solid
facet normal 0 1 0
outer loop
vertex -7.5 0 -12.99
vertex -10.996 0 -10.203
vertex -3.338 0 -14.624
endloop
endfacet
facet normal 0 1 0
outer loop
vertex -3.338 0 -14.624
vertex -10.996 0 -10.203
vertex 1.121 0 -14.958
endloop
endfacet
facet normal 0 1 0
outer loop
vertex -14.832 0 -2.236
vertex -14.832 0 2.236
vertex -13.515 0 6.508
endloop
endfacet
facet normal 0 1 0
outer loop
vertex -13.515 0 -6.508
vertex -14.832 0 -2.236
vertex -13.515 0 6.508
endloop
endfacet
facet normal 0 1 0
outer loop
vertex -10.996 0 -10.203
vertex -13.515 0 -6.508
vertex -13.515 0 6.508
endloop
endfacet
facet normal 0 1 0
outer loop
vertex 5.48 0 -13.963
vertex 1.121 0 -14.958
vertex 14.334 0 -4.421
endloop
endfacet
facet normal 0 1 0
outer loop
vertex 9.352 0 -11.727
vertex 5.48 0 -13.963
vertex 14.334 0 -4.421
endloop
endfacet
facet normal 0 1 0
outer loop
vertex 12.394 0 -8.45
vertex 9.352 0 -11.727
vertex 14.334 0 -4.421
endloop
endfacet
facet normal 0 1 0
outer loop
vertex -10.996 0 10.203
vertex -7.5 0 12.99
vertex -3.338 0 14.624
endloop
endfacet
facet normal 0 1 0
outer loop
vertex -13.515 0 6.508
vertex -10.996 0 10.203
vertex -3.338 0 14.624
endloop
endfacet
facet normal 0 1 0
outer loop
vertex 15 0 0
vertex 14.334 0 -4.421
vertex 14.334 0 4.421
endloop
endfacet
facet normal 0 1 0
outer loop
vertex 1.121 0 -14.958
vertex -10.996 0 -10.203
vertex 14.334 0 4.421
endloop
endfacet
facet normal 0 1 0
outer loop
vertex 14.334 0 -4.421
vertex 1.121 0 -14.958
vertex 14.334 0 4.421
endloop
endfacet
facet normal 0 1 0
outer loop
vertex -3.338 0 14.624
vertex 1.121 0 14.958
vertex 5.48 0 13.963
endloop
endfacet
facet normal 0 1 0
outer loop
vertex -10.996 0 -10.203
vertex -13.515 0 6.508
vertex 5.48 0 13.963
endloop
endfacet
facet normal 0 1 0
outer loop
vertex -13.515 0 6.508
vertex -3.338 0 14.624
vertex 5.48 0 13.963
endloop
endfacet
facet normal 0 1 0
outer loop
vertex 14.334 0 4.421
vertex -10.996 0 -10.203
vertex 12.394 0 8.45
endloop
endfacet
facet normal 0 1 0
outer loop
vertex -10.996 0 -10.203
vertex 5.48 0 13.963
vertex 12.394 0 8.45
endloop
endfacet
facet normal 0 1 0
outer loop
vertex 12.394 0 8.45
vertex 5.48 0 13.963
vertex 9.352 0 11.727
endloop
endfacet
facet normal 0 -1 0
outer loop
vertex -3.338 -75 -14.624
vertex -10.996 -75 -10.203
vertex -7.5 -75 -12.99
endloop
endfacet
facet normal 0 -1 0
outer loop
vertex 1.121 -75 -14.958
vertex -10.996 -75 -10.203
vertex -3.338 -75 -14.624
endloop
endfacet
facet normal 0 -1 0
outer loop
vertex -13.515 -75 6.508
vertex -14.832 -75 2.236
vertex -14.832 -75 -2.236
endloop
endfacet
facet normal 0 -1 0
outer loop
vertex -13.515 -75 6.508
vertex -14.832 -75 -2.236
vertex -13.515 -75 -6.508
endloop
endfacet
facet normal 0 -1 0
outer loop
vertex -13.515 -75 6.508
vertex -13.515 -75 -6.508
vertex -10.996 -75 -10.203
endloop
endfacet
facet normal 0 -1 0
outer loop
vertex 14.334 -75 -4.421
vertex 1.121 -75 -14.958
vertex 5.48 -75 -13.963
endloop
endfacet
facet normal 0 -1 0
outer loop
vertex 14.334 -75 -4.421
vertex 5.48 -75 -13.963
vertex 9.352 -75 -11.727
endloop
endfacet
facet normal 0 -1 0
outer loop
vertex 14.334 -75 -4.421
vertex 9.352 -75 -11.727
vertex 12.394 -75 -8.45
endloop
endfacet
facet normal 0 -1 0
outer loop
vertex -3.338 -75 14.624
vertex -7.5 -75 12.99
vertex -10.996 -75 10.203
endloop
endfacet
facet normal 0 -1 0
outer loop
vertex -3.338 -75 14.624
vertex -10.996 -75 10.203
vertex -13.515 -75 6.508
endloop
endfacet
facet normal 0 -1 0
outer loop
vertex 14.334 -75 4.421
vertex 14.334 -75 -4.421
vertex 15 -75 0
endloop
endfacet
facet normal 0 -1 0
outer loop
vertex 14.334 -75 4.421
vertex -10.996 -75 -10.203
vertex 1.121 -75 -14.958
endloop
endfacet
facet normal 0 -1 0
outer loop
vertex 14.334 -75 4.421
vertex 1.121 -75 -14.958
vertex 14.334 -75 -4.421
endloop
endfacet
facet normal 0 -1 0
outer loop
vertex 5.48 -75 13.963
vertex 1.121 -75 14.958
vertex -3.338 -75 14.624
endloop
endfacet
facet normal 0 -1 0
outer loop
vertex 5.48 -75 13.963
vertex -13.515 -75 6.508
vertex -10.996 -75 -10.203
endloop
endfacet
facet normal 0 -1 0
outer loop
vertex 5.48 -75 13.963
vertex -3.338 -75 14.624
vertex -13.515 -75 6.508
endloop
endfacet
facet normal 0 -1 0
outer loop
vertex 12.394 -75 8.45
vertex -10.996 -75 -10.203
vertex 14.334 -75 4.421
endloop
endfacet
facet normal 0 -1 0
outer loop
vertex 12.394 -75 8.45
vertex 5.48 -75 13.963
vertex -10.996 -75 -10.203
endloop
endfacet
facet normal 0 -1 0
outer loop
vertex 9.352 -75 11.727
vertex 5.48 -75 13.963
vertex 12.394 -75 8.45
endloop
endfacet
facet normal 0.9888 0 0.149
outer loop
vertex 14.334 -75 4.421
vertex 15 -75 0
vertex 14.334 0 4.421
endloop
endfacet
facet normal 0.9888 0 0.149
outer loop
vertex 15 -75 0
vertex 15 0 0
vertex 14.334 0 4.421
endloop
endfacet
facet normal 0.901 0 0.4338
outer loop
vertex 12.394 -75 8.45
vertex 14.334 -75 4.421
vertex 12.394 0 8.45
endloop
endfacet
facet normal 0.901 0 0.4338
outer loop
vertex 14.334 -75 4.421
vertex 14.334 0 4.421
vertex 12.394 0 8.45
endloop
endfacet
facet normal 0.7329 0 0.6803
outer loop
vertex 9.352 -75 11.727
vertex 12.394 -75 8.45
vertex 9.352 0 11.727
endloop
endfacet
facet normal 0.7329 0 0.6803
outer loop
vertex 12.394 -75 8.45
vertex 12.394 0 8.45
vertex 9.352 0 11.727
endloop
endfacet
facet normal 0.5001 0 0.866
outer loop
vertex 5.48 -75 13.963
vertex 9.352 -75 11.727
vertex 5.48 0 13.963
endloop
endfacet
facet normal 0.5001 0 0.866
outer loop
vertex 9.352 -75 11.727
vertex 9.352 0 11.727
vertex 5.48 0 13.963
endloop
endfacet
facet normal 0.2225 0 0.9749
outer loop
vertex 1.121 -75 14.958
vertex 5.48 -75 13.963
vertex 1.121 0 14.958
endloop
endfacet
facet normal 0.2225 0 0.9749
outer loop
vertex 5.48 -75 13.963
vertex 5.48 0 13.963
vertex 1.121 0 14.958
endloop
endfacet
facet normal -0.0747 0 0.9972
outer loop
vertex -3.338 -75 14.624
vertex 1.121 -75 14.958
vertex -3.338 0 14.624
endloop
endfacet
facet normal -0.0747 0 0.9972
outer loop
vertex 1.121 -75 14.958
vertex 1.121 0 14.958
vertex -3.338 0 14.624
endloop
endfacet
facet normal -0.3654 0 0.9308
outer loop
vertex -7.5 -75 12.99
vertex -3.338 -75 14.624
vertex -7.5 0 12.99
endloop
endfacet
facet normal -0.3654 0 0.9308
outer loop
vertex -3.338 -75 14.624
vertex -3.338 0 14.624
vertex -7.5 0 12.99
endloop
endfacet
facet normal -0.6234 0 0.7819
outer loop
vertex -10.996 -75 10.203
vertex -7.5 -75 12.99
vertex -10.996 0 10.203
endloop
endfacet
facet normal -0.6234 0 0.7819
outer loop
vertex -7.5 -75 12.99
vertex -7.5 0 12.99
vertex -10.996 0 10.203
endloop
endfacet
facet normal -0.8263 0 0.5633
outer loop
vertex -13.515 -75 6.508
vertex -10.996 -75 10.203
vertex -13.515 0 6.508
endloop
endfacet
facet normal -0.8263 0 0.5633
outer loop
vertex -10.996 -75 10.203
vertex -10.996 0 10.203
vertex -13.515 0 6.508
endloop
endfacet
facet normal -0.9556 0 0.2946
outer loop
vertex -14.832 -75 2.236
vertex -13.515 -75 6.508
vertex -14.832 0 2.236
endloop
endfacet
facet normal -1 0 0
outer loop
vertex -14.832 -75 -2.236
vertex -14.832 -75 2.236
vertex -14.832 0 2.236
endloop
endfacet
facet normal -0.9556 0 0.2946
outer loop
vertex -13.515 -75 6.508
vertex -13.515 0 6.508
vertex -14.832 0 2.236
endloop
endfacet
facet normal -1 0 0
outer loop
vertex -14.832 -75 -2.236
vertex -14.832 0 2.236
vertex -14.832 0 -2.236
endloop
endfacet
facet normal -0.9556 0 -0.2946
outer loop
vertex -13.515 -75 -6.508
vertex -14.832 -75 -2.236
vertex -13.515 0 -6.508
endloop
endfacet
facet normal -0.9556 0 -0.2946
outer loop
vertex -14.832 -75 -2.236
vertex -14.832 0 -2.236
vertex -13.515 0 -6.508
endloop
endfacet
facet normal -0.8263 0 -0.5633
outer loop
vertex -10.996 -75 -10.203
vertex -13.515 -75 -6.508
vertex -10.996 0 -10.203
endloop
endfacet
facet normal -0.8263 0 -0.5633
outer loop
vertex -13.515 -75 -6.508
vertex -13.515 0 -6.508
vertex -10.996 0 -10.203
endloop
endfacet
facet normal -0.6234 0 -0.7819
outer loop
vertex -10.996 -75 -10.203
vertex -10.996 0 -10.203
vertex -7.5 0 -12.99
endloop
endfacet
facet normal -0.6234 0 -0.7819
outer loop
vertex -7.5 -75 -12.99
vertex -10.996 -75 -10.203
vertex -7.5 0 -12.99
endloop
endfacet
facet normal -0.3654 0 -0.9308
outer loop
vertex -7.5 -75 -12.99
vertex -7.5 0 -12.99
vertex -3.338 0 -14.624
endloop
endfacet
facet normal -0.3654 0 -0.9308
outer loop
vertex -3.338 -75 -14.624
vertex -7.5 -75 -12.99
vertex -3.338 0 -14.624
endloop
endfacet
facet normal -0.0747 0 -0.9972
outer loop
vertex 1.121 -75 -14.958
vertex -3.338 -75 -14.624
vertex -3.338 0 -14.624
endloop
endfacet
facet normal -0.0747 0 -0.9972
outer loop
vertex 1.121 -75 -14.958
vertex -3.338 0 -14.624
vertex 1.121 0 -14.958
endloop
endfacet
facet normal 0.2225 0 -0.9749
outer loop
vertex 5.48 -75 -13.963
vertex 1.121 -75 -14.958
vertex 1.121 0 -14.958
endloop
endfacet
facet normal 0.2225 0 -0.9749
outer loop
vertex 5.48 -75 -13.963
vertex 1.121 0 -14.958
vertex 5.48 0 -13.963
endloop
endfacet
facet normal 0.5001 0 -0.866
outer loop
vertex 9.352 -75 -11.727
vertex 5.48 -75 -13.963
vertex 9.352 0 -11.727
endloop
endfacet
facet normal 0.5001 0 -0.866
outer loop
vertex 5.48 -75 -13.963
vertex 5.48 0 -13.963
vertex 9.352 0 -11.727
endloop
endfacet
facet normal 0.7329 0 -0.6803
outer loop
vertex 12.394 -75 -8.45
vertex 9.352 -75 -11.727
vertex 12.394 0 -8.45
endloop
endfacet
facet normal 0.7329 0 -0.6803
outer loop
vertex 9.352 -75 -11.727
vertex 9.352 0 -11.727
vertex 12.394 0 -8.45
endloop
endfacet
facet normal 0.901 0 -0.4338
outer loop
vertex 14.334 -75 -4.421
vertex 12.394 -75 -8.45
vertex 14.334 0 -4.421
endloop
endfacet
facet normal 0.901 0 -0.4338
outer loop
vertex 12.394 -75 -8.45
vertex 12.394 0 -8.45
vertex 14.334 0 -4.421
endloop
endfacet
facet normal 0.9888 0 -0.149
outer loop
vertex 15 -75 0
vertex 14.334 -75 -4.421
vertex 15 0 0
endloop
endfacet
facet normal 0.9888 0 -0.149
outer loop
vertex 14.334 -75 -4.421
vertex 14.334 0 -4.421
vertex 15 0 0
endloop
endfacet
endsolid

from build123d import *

# Parameters (mm, degrees)
F0_R     = 15
F1_DEPTH = 25
F2_DEPTH = 25
F3_DEPTH = 25


with BuildPart() as f1:
    # F0 (on Front) → F1 (new body)
    with BuildSketch(Plane.XZ):
        Circle(F0_R)
    extrude(amount=F1_DEPTH)

    # F2 (add): a face of the model
    f2_faces = [f1.faces().sort_by_distance(p)[0] for p in [
        (0, -25, 0),
    ]]
    extrude(f2_faces, amount=F2_DEPTH)

    # F3 (add): a face of the model
    f3_faces = [f1.faces().sort_by_distance(p)[0] for p in [
        (0, -50, 0),
    ]]
    extrude(f3_faces, amount=F3_DEPTH)


solid = f1.part
